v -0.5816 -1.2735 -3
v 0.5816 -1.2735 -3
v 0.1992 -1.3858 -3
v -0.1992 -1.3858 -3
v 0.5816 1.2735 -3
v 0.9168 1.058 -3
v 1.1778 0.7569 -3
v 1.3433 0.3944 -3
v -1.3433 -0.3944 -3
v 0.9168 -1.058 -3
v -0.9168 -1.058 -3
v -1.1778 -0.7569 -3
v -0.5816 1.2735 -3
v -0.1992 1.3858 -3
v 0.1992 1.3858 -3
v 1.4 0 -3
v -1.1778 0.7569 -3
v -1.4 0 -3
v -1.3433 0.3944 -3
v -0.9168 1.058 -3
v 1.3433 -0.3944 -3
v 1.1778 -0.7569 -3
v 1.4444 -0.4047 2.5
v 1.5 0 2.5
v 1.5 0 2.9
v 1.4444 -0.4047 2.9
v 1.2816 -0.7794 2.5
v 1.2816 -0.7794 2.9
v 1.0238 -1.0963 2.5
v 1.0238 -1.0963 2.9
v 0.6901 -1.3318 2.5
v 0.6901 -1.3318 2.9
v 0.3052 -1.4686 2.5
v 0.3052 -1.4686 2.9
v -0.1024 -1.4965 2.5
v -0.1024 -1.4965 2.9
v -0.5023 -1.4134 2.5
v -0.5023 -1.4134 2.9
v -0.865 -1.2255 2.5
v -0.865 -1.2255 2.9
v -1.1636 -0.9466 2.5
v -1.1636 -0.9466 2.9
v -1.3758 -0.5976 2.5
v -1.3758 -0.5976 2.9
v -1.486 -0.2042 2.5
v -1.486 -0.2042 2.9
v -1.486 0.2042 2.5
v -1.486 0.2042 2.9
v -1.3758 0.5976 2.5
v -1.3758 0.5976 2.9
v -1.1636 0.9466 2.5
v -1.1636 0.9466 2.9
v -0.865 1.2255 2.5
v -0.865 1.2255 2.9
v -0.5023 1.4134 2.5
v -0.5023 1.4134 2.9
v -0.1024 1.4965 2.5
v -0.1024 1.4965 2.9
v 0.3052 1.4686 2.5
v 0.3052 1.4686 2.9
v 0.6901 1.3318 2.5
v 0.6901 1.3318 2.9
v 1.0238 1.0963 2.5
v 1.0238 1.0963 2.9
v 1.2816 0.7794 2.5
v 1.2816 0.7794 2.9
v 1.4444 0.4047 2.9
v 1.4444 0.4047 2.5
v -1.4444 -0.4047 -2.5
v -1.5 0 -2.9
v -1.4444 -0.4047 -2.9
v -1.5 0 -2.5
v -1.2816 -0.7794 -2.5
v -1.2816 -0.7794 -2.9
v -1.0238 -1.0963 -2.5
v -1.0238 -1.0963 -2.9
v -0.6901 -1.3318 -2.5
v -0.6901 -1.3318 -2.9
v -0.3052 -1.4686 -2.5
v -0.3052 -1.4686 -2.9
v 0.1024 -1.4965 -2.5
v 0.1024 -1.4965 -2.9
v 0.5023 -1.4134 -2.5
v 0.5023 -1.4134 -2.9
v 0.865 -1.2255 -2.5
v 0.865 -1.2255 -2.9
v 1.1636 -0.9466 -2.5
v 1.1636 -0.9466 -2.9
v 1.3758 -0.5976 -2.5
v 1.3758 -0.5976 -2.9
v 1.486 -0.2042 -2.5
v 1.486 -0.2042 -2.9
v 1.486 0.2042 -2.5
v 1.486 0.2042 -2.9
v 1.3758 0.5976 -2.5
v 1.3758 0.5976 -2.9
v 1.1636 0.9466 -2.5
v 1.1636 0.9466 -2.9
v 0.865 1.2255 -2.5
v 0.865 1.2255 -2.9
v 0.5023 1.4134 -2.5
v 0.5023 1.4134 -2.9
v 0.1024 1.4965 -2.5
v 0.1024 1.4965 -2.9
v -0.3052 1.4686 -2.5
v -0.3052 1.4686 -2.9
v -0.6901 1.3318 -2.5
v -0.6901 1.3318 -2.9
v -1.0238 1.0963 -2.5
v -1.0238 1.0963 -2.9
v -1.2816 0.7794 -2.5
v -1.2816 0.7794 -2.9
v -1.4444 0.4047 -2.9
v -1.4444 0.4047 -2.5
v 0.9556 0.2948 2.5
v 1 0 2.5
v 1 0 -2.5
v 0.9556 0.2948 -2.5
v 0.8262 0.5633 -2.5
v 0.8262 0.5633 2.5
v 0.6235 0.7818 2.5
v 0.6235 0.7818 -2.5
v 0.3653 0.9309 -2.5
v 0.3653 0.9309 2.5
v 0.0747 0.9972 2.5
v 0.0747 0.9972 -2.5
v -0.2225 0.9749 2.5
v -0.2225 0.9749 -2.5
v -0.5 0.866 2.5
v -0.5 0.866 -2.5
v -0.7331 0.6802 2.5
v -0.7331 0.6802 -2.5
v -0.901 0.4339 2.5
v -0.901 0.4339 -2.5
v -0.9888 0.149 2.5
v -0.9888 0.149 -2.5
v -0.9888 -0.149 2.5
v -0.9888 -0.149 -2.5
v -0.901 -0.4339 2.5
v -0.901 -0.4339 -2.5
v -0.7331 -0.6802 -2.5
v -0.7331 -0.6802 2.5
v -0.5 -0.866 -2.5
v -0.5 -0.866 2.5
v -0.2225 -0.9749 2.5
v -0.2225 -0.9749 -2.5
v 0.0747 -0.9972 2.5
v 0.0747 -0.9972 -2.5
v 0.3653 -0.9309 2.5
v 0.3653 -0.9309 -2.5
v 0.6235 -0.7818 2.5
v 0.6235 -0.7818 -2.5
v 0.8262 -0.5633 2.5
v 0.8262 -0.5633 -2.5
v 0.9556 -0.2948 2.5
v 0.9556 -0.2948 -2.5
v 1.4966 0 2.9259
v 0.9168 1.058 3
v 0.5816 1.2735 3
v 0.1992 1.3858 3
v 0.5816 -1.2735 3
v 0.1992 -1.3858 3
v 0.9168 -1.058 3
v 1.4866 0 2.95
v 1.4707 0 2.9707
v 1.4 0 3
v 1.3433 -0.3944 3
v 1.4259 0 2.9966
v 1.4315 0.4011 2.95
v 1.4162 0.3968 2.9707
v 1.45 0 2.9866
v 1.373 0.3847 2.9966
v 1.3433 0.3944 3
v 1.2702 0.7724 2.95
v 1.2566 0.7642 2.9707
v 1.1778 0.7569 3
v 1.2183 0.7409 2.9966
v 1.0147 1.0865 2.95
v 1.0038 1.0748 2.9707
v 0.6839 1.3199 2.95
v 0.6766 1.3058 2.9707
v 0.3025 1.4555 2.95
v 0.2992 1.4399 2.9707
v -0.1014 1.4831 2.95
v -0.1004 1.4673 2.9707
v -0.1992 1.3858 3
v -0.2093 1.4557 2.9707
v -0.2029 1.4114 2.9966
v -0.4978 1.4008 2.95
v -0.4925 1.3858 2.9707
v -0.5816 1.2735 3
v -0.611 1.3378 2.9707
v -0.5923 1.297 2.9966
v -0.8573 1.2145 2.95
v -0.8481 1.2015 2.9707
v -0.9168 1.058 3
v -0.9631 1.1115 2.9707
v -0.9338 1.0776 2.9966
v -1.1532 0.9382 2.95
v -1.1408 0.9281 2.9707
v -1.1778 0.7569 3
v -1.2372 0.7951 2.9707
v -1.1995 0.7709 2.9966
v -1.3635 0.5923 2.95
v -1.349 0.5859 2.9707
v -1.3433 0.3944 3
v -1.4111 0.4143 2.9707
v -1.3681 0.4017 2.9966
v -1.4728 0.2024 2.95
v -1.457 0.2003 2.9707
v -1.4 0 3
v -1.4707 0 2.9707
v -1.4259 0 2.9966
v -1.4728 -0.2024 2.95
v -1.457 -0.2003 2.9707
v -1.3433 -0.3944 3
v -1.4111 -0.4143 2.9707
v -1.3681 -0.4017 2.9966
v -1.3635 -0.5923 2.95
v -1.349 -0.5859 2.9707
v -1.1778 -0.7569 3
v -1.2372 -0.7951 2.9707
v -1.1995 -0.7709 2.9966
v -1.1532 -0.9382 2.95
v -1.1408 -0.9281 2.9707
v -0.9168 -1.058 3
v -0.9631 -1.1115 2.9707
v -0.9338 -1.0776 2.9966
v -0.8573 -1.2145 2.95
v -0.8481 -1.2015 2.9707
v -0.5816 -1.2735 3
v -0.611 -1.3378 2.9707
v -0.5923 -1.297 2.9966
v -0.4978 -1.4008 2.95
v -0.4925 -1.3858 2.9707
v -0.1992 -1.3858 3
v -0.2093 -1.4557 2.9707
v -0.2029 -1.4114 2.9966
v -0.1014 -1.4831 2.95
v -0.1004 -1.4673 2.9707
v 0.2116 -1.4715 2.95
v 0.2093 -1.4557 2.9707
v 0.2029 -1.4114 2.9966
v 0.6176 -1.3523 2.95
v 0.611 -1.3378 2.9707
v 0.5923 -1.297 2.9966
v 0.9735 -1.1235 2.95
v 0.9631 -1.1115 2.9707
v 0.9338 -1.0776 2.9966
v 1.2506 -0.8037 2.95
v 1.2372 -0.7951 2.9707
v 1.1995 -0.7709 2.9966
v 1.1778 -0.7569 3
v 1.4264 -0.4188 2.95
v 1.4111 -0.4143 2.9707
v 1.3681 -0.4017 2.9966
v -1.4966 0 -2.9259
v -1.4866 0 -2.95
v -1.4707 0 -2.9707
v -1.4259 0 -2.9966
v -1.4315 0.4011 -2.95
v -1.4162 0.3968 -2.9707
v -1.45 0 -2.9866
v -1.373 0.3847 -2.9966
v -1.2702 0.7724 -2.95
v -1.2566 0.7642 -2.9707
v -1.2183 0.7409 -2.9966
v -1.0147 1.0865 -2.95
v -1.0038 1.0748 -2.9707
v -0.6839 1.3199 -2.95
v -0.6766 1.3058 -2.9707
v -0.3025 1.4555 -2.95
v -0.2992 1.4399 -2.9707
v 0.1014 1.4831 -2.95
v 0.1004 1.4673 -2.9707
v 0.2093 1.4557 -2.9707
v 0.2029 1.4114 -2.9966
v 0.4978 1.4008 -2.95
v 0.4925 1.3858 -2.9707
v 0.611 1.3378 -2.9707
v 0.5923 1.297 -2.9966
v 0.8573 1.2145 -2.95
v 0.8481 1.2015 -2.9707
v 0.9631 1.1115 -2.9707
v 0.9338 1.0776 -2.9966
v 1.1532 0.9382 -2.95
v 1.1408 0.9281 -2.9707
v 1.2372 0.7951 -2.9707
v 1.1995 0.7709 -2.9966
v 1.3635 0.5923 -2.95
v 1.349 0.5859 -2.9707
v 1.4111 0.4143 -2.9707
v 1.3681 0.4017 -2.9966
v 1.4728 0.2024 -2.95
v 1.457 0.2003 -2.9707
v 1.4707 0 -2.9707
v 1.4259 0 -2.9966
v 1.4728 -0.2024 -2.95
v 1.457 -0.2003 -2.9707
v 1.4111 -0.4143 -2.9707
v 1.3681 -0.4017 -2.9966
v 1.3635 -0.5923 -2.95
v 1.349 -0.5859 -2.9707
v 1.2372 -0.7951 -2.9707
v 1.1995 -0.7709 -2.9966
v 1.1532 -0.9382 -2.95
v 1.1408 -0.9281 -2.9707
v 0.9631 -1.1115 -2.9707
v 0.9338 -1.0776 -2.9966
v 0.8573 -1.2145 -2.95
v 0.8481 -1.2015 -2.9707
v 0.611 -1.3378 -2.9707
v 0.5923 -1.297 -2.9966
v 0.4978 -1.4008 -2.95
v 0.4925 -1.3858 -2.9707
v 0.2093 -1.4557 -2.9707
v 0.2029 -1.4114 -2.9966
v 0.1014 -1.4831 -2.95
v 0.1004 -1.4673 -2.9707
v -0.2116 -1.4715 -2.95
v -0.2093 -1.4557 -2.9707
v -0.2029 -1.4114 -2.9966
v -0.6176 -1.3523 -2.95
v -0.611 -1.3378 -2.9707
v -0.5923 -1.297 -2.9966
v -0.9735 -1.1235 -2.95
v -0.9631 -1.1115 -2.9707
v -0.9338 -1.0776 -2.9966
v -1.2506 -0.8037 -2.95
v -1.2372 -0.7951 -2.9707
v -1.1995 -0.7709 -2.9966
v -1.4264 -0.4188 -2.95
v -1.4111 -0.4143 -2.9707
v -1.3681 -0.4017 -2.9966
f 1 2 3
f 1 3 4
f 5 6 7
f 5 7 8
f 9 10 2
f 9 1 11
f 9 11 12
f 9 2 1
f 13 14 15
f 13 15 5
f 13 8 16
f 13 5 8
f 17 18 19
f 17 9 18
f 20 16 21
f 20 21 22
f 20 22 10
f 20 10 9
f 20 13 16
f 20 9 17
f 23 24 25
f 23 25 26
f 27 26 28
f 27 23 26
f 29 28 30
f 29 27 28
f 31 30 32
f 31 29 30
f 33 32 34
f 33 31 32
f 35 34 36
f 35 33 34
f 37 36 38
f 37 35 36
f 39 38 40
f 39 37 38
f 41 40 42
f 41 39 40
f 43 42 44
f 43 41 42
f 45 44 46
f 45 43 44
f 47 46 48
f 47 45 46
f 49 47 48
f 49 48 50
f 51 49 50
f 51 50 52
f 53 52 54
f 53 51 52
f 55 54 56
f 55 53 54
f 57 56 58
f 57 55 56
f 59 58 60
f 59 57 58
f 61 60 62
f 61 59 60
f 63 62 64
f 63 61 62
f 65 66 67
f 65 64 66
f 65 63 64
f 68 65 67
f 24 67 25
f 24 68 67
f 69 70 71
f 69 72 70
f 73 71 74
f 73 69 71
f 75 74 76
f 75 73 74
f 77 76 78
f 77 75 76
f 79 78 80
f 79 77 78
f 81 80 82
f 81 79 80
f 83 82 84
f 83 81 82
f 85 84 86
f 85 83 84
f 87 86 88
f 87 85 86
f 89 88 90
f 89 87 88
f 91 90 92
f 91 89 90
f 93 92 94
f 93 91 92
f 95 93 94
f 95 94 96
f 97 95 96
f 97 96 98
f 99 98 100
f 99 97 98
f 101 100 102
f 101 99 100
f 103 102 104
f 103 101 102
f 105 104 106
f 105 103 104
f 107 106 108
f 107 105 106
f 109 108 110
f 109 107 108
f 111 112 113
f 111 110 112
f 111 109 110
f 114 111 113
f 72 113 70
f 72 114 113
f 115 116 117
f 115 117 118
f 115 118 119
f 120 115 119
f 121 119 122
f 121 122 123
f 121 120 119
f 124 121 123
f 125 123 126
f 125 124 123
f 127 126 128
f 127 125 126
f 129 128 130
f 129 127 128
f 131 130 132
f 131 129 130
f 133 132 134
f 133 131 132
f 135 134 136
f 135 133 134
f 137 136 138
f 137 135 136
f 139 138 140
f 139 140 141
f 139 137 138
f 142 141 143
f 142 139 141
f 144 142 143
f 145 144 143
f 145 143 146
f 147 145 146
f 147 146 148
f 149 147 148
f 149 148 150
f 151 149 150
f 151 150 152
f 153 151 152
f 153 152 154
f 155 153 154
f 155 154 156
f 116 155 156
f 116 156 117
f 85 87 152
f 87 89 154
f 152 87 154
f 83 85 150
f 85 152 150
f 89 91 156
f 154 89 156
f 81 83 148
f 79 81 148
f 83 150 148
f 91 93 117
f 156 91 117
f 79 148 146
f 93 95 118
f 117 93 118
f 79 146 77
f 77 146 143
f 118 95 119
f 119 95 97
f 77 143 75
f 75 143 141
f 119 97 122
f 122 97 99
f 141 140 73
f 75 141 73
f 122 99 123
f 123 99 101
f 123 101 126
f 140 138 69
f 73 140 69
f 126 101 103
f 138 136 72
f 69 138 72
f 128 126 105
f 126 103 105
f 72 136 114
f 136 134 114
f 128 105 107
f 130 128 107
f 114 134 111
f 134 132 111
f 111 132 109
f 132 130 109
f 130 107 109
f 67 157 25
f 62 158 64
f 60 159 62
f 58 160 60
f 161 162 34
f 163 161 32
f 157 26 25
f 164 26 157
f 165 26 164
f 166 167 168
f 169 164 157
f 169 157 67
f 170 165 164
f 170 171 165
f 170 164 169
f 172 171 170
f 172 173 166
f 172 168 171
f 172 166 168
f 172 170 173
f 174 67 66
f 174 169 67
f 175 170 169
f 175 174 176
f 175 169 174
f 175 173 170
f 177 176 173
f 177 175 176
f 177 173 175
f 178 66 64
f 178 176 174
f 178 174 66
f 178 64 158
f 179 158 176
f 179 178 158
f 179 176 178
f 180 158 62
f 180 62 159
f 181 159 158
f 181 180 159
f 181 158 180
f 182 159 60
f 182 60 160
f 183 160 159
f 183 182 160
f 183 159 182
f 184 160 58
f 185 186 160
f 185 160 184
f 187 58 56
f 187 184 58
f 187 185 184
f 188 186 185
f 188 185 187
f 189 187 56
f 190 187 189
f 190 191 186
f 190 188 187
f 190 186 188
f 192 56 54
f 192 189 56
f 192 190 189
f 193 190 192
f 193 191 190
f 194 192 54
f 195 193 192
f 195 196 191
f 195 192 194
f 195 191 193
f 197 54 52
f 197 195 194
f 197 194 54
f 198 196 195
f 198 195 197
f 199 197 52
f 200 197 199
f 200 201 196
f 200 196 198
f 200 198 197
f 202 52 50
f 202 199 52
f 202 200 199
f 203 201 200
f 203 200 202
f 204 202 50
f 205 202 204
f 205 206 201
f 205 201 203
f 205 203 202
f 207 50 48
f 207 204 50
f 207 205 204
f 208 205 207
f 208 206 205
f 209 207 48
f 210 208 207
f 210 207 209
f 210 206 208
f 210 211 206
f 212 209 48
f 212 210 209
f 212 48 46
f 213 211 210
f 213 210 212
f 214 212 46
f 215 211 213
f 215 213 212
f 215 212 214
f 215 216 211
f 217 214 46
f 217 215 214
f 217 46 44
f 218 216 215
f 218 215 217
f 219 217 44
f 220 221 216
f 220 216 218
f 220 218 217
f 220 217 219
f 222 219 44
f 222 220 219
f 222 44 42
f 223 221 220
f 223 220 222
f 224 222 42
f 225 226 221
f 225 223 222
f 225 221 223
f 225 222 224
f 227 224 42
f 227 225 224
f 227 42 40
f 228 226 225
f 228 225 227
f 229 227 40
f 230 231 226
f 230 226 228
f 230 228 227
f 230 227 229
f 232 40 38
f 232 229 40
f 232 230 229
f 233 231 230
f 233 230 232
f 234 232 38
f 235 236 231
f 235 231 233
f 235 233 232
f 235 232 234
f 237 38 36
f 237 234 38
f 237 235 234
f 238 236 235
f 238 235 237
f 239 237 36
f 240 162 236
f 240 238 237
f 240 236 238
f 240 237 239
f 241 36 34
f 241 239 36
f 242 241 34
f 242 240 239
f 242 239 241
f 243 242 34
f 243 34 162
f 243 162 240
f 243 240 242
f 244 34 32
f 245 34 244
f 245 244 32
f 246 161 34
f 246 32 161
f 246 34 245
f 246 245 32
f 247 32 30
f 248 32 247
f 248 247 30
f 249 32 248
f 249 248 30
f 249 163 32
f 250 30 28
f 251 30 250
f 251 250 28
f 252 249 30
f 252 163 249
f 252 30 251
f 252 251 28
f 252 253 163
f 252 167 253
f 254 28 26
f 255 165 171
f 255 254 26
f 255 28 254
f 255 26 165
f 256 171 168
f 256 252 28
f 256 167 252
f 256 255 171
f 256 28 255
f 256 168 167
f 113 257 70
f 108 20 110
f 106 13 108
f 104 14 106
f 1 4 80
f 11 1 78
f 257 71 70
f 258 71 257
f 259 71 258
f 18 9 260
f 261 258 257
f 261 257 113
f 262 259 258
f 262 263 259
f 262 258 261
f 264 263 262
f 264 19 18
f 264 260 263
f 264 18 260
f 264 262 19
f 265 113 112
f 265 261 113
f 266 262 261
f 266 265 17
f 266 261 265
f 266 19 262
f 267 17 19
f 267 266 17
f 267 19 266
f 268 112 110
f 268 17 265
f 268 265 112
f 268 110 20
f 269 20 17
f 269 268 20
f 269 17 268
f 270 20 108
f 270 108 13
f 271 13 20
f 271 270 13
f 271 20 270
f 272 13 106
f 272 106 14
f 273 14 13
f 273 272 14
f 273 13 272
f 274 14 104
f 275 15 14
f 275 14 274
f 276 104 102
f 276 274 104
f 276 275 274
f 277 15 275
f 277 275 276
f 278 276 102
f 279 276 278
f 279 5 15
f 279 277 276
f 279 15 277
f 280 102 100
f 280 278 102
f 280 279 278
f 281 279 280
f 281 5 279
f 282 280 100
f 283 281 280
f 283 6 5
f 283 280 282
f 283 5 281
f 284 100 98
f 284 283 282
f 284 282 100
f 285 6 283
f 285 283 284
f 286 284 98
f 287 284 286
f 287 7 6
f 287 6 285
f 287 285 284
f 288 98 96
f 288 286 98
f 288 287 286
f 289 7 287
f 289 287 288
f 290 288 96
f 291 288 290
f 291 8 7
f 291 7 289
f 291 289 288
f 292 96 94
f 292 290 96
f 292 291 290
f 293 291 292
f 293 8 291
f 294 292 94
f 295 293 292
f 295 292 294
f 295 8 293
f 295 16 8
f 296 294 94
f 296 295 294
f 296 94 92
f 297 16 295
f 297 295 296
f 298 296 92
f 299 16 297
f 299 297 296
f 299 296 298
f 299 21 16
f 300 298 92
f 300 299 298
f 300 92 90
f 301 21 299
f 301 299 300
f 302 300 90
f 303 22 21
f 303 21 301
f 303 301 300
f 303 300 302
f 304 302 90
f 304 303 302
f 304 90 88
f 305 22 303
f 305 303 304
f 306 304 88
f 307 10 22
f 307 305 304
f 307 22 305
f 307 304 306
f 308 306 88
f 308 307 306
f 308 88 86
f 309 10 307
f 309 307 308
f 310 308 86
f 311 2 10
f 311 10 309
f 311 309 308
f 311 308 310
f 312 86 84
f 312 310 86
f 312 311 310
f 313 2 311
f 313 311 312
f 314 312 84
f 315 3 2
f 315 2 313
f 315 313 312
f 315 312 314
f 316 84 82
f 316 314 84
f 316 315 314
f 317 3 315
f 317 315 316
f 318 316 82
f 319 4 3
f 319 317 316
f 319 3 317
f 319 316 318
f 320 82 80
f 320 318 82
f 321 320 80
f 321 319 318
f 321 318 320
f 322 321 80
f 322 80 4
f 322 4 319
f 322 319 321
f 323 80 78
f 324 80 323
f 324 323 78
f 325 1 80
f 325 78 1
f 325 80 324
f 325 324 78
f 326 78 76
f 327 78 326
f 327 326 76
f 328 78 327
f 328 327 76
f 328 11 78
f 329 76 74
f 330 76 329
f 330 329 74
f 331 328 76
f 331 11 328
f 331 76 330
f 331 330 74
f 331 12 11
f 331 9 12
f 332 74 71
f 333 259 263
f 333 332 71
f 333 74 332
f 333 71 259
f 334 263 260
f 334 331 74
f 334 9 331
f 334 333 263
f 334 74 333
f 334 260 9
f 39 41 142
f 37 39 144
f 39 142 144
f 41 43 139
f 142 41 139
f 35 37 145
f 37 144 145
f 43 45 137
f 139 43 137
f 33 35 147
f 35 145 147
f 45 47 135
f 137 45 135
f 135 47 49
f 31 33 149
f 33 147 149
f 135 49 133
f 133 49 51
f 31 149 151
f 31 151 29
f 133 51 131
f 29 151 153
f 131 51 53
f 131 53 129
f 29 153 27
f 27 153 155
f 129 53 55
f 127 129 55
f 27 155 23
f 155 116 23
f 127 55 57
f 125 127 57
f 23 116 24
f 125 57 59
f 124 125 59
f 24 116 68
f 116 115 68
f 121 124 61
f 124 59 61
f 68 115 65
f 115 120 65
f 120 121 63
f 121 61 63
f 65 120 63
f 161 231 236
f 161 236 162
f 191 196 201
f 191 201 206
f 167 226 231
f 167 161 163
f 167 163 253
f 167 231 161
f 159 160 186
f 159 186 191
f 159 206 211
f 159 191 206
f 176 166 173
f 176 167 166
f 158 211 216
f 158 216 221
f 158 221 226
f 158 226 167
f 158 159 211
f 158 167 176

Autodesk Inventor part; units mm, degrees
ref_plane "YZ Plane" through (0, 0, 0) normal (1, 0, 0) x (0, 1, 0)
sketch "Sketch1" plane through (0, 0, 0) normal (0, 0, 1) x (1, 0, 0)
  circle A0 centre (0, 0) radius 1
  dimension "d0" = 2
extrude "Extrusion1" add sketch "Sketch1" along normal mid plane 5
ref_plane "Work Plane1" through (0, 0, 2.5) normal (0, 0, 1) x (1, 0, 0)
ref_plane "Work Plane2" through (0, 0, -2.5) normal (0, 0, -1) x (-1, 0, 0)
sketch "Sketch2" plane through (0, 0, 2.5) normal (0, 0, 1) x (1, 0, 0)
  circle A0 centre (0, 0) radius 1.5
  dimension "d5" = 3
extrude "Extrusion2" add sketch "Sketch2" along normal blind 0.5
sketch "Sketch3" plane through (0, 0, -2.5) normal (0, 0, -1) x (-1, 0, 0)
  circle A0 centre (0, 0) radius 1 projected
  circle A1 centre (0, 0) radius 1.5
  dimension "d8" = 3
extrude "Extrusion3" add sketch "Sketch3" along normal blind 0.5 contours A0 | A1
fillet "Fillet1" radius 0.1 2 edges at (-1.5, 0, 3) (1.5, 0, -3)
properties part number "New_ThinAxle1"
